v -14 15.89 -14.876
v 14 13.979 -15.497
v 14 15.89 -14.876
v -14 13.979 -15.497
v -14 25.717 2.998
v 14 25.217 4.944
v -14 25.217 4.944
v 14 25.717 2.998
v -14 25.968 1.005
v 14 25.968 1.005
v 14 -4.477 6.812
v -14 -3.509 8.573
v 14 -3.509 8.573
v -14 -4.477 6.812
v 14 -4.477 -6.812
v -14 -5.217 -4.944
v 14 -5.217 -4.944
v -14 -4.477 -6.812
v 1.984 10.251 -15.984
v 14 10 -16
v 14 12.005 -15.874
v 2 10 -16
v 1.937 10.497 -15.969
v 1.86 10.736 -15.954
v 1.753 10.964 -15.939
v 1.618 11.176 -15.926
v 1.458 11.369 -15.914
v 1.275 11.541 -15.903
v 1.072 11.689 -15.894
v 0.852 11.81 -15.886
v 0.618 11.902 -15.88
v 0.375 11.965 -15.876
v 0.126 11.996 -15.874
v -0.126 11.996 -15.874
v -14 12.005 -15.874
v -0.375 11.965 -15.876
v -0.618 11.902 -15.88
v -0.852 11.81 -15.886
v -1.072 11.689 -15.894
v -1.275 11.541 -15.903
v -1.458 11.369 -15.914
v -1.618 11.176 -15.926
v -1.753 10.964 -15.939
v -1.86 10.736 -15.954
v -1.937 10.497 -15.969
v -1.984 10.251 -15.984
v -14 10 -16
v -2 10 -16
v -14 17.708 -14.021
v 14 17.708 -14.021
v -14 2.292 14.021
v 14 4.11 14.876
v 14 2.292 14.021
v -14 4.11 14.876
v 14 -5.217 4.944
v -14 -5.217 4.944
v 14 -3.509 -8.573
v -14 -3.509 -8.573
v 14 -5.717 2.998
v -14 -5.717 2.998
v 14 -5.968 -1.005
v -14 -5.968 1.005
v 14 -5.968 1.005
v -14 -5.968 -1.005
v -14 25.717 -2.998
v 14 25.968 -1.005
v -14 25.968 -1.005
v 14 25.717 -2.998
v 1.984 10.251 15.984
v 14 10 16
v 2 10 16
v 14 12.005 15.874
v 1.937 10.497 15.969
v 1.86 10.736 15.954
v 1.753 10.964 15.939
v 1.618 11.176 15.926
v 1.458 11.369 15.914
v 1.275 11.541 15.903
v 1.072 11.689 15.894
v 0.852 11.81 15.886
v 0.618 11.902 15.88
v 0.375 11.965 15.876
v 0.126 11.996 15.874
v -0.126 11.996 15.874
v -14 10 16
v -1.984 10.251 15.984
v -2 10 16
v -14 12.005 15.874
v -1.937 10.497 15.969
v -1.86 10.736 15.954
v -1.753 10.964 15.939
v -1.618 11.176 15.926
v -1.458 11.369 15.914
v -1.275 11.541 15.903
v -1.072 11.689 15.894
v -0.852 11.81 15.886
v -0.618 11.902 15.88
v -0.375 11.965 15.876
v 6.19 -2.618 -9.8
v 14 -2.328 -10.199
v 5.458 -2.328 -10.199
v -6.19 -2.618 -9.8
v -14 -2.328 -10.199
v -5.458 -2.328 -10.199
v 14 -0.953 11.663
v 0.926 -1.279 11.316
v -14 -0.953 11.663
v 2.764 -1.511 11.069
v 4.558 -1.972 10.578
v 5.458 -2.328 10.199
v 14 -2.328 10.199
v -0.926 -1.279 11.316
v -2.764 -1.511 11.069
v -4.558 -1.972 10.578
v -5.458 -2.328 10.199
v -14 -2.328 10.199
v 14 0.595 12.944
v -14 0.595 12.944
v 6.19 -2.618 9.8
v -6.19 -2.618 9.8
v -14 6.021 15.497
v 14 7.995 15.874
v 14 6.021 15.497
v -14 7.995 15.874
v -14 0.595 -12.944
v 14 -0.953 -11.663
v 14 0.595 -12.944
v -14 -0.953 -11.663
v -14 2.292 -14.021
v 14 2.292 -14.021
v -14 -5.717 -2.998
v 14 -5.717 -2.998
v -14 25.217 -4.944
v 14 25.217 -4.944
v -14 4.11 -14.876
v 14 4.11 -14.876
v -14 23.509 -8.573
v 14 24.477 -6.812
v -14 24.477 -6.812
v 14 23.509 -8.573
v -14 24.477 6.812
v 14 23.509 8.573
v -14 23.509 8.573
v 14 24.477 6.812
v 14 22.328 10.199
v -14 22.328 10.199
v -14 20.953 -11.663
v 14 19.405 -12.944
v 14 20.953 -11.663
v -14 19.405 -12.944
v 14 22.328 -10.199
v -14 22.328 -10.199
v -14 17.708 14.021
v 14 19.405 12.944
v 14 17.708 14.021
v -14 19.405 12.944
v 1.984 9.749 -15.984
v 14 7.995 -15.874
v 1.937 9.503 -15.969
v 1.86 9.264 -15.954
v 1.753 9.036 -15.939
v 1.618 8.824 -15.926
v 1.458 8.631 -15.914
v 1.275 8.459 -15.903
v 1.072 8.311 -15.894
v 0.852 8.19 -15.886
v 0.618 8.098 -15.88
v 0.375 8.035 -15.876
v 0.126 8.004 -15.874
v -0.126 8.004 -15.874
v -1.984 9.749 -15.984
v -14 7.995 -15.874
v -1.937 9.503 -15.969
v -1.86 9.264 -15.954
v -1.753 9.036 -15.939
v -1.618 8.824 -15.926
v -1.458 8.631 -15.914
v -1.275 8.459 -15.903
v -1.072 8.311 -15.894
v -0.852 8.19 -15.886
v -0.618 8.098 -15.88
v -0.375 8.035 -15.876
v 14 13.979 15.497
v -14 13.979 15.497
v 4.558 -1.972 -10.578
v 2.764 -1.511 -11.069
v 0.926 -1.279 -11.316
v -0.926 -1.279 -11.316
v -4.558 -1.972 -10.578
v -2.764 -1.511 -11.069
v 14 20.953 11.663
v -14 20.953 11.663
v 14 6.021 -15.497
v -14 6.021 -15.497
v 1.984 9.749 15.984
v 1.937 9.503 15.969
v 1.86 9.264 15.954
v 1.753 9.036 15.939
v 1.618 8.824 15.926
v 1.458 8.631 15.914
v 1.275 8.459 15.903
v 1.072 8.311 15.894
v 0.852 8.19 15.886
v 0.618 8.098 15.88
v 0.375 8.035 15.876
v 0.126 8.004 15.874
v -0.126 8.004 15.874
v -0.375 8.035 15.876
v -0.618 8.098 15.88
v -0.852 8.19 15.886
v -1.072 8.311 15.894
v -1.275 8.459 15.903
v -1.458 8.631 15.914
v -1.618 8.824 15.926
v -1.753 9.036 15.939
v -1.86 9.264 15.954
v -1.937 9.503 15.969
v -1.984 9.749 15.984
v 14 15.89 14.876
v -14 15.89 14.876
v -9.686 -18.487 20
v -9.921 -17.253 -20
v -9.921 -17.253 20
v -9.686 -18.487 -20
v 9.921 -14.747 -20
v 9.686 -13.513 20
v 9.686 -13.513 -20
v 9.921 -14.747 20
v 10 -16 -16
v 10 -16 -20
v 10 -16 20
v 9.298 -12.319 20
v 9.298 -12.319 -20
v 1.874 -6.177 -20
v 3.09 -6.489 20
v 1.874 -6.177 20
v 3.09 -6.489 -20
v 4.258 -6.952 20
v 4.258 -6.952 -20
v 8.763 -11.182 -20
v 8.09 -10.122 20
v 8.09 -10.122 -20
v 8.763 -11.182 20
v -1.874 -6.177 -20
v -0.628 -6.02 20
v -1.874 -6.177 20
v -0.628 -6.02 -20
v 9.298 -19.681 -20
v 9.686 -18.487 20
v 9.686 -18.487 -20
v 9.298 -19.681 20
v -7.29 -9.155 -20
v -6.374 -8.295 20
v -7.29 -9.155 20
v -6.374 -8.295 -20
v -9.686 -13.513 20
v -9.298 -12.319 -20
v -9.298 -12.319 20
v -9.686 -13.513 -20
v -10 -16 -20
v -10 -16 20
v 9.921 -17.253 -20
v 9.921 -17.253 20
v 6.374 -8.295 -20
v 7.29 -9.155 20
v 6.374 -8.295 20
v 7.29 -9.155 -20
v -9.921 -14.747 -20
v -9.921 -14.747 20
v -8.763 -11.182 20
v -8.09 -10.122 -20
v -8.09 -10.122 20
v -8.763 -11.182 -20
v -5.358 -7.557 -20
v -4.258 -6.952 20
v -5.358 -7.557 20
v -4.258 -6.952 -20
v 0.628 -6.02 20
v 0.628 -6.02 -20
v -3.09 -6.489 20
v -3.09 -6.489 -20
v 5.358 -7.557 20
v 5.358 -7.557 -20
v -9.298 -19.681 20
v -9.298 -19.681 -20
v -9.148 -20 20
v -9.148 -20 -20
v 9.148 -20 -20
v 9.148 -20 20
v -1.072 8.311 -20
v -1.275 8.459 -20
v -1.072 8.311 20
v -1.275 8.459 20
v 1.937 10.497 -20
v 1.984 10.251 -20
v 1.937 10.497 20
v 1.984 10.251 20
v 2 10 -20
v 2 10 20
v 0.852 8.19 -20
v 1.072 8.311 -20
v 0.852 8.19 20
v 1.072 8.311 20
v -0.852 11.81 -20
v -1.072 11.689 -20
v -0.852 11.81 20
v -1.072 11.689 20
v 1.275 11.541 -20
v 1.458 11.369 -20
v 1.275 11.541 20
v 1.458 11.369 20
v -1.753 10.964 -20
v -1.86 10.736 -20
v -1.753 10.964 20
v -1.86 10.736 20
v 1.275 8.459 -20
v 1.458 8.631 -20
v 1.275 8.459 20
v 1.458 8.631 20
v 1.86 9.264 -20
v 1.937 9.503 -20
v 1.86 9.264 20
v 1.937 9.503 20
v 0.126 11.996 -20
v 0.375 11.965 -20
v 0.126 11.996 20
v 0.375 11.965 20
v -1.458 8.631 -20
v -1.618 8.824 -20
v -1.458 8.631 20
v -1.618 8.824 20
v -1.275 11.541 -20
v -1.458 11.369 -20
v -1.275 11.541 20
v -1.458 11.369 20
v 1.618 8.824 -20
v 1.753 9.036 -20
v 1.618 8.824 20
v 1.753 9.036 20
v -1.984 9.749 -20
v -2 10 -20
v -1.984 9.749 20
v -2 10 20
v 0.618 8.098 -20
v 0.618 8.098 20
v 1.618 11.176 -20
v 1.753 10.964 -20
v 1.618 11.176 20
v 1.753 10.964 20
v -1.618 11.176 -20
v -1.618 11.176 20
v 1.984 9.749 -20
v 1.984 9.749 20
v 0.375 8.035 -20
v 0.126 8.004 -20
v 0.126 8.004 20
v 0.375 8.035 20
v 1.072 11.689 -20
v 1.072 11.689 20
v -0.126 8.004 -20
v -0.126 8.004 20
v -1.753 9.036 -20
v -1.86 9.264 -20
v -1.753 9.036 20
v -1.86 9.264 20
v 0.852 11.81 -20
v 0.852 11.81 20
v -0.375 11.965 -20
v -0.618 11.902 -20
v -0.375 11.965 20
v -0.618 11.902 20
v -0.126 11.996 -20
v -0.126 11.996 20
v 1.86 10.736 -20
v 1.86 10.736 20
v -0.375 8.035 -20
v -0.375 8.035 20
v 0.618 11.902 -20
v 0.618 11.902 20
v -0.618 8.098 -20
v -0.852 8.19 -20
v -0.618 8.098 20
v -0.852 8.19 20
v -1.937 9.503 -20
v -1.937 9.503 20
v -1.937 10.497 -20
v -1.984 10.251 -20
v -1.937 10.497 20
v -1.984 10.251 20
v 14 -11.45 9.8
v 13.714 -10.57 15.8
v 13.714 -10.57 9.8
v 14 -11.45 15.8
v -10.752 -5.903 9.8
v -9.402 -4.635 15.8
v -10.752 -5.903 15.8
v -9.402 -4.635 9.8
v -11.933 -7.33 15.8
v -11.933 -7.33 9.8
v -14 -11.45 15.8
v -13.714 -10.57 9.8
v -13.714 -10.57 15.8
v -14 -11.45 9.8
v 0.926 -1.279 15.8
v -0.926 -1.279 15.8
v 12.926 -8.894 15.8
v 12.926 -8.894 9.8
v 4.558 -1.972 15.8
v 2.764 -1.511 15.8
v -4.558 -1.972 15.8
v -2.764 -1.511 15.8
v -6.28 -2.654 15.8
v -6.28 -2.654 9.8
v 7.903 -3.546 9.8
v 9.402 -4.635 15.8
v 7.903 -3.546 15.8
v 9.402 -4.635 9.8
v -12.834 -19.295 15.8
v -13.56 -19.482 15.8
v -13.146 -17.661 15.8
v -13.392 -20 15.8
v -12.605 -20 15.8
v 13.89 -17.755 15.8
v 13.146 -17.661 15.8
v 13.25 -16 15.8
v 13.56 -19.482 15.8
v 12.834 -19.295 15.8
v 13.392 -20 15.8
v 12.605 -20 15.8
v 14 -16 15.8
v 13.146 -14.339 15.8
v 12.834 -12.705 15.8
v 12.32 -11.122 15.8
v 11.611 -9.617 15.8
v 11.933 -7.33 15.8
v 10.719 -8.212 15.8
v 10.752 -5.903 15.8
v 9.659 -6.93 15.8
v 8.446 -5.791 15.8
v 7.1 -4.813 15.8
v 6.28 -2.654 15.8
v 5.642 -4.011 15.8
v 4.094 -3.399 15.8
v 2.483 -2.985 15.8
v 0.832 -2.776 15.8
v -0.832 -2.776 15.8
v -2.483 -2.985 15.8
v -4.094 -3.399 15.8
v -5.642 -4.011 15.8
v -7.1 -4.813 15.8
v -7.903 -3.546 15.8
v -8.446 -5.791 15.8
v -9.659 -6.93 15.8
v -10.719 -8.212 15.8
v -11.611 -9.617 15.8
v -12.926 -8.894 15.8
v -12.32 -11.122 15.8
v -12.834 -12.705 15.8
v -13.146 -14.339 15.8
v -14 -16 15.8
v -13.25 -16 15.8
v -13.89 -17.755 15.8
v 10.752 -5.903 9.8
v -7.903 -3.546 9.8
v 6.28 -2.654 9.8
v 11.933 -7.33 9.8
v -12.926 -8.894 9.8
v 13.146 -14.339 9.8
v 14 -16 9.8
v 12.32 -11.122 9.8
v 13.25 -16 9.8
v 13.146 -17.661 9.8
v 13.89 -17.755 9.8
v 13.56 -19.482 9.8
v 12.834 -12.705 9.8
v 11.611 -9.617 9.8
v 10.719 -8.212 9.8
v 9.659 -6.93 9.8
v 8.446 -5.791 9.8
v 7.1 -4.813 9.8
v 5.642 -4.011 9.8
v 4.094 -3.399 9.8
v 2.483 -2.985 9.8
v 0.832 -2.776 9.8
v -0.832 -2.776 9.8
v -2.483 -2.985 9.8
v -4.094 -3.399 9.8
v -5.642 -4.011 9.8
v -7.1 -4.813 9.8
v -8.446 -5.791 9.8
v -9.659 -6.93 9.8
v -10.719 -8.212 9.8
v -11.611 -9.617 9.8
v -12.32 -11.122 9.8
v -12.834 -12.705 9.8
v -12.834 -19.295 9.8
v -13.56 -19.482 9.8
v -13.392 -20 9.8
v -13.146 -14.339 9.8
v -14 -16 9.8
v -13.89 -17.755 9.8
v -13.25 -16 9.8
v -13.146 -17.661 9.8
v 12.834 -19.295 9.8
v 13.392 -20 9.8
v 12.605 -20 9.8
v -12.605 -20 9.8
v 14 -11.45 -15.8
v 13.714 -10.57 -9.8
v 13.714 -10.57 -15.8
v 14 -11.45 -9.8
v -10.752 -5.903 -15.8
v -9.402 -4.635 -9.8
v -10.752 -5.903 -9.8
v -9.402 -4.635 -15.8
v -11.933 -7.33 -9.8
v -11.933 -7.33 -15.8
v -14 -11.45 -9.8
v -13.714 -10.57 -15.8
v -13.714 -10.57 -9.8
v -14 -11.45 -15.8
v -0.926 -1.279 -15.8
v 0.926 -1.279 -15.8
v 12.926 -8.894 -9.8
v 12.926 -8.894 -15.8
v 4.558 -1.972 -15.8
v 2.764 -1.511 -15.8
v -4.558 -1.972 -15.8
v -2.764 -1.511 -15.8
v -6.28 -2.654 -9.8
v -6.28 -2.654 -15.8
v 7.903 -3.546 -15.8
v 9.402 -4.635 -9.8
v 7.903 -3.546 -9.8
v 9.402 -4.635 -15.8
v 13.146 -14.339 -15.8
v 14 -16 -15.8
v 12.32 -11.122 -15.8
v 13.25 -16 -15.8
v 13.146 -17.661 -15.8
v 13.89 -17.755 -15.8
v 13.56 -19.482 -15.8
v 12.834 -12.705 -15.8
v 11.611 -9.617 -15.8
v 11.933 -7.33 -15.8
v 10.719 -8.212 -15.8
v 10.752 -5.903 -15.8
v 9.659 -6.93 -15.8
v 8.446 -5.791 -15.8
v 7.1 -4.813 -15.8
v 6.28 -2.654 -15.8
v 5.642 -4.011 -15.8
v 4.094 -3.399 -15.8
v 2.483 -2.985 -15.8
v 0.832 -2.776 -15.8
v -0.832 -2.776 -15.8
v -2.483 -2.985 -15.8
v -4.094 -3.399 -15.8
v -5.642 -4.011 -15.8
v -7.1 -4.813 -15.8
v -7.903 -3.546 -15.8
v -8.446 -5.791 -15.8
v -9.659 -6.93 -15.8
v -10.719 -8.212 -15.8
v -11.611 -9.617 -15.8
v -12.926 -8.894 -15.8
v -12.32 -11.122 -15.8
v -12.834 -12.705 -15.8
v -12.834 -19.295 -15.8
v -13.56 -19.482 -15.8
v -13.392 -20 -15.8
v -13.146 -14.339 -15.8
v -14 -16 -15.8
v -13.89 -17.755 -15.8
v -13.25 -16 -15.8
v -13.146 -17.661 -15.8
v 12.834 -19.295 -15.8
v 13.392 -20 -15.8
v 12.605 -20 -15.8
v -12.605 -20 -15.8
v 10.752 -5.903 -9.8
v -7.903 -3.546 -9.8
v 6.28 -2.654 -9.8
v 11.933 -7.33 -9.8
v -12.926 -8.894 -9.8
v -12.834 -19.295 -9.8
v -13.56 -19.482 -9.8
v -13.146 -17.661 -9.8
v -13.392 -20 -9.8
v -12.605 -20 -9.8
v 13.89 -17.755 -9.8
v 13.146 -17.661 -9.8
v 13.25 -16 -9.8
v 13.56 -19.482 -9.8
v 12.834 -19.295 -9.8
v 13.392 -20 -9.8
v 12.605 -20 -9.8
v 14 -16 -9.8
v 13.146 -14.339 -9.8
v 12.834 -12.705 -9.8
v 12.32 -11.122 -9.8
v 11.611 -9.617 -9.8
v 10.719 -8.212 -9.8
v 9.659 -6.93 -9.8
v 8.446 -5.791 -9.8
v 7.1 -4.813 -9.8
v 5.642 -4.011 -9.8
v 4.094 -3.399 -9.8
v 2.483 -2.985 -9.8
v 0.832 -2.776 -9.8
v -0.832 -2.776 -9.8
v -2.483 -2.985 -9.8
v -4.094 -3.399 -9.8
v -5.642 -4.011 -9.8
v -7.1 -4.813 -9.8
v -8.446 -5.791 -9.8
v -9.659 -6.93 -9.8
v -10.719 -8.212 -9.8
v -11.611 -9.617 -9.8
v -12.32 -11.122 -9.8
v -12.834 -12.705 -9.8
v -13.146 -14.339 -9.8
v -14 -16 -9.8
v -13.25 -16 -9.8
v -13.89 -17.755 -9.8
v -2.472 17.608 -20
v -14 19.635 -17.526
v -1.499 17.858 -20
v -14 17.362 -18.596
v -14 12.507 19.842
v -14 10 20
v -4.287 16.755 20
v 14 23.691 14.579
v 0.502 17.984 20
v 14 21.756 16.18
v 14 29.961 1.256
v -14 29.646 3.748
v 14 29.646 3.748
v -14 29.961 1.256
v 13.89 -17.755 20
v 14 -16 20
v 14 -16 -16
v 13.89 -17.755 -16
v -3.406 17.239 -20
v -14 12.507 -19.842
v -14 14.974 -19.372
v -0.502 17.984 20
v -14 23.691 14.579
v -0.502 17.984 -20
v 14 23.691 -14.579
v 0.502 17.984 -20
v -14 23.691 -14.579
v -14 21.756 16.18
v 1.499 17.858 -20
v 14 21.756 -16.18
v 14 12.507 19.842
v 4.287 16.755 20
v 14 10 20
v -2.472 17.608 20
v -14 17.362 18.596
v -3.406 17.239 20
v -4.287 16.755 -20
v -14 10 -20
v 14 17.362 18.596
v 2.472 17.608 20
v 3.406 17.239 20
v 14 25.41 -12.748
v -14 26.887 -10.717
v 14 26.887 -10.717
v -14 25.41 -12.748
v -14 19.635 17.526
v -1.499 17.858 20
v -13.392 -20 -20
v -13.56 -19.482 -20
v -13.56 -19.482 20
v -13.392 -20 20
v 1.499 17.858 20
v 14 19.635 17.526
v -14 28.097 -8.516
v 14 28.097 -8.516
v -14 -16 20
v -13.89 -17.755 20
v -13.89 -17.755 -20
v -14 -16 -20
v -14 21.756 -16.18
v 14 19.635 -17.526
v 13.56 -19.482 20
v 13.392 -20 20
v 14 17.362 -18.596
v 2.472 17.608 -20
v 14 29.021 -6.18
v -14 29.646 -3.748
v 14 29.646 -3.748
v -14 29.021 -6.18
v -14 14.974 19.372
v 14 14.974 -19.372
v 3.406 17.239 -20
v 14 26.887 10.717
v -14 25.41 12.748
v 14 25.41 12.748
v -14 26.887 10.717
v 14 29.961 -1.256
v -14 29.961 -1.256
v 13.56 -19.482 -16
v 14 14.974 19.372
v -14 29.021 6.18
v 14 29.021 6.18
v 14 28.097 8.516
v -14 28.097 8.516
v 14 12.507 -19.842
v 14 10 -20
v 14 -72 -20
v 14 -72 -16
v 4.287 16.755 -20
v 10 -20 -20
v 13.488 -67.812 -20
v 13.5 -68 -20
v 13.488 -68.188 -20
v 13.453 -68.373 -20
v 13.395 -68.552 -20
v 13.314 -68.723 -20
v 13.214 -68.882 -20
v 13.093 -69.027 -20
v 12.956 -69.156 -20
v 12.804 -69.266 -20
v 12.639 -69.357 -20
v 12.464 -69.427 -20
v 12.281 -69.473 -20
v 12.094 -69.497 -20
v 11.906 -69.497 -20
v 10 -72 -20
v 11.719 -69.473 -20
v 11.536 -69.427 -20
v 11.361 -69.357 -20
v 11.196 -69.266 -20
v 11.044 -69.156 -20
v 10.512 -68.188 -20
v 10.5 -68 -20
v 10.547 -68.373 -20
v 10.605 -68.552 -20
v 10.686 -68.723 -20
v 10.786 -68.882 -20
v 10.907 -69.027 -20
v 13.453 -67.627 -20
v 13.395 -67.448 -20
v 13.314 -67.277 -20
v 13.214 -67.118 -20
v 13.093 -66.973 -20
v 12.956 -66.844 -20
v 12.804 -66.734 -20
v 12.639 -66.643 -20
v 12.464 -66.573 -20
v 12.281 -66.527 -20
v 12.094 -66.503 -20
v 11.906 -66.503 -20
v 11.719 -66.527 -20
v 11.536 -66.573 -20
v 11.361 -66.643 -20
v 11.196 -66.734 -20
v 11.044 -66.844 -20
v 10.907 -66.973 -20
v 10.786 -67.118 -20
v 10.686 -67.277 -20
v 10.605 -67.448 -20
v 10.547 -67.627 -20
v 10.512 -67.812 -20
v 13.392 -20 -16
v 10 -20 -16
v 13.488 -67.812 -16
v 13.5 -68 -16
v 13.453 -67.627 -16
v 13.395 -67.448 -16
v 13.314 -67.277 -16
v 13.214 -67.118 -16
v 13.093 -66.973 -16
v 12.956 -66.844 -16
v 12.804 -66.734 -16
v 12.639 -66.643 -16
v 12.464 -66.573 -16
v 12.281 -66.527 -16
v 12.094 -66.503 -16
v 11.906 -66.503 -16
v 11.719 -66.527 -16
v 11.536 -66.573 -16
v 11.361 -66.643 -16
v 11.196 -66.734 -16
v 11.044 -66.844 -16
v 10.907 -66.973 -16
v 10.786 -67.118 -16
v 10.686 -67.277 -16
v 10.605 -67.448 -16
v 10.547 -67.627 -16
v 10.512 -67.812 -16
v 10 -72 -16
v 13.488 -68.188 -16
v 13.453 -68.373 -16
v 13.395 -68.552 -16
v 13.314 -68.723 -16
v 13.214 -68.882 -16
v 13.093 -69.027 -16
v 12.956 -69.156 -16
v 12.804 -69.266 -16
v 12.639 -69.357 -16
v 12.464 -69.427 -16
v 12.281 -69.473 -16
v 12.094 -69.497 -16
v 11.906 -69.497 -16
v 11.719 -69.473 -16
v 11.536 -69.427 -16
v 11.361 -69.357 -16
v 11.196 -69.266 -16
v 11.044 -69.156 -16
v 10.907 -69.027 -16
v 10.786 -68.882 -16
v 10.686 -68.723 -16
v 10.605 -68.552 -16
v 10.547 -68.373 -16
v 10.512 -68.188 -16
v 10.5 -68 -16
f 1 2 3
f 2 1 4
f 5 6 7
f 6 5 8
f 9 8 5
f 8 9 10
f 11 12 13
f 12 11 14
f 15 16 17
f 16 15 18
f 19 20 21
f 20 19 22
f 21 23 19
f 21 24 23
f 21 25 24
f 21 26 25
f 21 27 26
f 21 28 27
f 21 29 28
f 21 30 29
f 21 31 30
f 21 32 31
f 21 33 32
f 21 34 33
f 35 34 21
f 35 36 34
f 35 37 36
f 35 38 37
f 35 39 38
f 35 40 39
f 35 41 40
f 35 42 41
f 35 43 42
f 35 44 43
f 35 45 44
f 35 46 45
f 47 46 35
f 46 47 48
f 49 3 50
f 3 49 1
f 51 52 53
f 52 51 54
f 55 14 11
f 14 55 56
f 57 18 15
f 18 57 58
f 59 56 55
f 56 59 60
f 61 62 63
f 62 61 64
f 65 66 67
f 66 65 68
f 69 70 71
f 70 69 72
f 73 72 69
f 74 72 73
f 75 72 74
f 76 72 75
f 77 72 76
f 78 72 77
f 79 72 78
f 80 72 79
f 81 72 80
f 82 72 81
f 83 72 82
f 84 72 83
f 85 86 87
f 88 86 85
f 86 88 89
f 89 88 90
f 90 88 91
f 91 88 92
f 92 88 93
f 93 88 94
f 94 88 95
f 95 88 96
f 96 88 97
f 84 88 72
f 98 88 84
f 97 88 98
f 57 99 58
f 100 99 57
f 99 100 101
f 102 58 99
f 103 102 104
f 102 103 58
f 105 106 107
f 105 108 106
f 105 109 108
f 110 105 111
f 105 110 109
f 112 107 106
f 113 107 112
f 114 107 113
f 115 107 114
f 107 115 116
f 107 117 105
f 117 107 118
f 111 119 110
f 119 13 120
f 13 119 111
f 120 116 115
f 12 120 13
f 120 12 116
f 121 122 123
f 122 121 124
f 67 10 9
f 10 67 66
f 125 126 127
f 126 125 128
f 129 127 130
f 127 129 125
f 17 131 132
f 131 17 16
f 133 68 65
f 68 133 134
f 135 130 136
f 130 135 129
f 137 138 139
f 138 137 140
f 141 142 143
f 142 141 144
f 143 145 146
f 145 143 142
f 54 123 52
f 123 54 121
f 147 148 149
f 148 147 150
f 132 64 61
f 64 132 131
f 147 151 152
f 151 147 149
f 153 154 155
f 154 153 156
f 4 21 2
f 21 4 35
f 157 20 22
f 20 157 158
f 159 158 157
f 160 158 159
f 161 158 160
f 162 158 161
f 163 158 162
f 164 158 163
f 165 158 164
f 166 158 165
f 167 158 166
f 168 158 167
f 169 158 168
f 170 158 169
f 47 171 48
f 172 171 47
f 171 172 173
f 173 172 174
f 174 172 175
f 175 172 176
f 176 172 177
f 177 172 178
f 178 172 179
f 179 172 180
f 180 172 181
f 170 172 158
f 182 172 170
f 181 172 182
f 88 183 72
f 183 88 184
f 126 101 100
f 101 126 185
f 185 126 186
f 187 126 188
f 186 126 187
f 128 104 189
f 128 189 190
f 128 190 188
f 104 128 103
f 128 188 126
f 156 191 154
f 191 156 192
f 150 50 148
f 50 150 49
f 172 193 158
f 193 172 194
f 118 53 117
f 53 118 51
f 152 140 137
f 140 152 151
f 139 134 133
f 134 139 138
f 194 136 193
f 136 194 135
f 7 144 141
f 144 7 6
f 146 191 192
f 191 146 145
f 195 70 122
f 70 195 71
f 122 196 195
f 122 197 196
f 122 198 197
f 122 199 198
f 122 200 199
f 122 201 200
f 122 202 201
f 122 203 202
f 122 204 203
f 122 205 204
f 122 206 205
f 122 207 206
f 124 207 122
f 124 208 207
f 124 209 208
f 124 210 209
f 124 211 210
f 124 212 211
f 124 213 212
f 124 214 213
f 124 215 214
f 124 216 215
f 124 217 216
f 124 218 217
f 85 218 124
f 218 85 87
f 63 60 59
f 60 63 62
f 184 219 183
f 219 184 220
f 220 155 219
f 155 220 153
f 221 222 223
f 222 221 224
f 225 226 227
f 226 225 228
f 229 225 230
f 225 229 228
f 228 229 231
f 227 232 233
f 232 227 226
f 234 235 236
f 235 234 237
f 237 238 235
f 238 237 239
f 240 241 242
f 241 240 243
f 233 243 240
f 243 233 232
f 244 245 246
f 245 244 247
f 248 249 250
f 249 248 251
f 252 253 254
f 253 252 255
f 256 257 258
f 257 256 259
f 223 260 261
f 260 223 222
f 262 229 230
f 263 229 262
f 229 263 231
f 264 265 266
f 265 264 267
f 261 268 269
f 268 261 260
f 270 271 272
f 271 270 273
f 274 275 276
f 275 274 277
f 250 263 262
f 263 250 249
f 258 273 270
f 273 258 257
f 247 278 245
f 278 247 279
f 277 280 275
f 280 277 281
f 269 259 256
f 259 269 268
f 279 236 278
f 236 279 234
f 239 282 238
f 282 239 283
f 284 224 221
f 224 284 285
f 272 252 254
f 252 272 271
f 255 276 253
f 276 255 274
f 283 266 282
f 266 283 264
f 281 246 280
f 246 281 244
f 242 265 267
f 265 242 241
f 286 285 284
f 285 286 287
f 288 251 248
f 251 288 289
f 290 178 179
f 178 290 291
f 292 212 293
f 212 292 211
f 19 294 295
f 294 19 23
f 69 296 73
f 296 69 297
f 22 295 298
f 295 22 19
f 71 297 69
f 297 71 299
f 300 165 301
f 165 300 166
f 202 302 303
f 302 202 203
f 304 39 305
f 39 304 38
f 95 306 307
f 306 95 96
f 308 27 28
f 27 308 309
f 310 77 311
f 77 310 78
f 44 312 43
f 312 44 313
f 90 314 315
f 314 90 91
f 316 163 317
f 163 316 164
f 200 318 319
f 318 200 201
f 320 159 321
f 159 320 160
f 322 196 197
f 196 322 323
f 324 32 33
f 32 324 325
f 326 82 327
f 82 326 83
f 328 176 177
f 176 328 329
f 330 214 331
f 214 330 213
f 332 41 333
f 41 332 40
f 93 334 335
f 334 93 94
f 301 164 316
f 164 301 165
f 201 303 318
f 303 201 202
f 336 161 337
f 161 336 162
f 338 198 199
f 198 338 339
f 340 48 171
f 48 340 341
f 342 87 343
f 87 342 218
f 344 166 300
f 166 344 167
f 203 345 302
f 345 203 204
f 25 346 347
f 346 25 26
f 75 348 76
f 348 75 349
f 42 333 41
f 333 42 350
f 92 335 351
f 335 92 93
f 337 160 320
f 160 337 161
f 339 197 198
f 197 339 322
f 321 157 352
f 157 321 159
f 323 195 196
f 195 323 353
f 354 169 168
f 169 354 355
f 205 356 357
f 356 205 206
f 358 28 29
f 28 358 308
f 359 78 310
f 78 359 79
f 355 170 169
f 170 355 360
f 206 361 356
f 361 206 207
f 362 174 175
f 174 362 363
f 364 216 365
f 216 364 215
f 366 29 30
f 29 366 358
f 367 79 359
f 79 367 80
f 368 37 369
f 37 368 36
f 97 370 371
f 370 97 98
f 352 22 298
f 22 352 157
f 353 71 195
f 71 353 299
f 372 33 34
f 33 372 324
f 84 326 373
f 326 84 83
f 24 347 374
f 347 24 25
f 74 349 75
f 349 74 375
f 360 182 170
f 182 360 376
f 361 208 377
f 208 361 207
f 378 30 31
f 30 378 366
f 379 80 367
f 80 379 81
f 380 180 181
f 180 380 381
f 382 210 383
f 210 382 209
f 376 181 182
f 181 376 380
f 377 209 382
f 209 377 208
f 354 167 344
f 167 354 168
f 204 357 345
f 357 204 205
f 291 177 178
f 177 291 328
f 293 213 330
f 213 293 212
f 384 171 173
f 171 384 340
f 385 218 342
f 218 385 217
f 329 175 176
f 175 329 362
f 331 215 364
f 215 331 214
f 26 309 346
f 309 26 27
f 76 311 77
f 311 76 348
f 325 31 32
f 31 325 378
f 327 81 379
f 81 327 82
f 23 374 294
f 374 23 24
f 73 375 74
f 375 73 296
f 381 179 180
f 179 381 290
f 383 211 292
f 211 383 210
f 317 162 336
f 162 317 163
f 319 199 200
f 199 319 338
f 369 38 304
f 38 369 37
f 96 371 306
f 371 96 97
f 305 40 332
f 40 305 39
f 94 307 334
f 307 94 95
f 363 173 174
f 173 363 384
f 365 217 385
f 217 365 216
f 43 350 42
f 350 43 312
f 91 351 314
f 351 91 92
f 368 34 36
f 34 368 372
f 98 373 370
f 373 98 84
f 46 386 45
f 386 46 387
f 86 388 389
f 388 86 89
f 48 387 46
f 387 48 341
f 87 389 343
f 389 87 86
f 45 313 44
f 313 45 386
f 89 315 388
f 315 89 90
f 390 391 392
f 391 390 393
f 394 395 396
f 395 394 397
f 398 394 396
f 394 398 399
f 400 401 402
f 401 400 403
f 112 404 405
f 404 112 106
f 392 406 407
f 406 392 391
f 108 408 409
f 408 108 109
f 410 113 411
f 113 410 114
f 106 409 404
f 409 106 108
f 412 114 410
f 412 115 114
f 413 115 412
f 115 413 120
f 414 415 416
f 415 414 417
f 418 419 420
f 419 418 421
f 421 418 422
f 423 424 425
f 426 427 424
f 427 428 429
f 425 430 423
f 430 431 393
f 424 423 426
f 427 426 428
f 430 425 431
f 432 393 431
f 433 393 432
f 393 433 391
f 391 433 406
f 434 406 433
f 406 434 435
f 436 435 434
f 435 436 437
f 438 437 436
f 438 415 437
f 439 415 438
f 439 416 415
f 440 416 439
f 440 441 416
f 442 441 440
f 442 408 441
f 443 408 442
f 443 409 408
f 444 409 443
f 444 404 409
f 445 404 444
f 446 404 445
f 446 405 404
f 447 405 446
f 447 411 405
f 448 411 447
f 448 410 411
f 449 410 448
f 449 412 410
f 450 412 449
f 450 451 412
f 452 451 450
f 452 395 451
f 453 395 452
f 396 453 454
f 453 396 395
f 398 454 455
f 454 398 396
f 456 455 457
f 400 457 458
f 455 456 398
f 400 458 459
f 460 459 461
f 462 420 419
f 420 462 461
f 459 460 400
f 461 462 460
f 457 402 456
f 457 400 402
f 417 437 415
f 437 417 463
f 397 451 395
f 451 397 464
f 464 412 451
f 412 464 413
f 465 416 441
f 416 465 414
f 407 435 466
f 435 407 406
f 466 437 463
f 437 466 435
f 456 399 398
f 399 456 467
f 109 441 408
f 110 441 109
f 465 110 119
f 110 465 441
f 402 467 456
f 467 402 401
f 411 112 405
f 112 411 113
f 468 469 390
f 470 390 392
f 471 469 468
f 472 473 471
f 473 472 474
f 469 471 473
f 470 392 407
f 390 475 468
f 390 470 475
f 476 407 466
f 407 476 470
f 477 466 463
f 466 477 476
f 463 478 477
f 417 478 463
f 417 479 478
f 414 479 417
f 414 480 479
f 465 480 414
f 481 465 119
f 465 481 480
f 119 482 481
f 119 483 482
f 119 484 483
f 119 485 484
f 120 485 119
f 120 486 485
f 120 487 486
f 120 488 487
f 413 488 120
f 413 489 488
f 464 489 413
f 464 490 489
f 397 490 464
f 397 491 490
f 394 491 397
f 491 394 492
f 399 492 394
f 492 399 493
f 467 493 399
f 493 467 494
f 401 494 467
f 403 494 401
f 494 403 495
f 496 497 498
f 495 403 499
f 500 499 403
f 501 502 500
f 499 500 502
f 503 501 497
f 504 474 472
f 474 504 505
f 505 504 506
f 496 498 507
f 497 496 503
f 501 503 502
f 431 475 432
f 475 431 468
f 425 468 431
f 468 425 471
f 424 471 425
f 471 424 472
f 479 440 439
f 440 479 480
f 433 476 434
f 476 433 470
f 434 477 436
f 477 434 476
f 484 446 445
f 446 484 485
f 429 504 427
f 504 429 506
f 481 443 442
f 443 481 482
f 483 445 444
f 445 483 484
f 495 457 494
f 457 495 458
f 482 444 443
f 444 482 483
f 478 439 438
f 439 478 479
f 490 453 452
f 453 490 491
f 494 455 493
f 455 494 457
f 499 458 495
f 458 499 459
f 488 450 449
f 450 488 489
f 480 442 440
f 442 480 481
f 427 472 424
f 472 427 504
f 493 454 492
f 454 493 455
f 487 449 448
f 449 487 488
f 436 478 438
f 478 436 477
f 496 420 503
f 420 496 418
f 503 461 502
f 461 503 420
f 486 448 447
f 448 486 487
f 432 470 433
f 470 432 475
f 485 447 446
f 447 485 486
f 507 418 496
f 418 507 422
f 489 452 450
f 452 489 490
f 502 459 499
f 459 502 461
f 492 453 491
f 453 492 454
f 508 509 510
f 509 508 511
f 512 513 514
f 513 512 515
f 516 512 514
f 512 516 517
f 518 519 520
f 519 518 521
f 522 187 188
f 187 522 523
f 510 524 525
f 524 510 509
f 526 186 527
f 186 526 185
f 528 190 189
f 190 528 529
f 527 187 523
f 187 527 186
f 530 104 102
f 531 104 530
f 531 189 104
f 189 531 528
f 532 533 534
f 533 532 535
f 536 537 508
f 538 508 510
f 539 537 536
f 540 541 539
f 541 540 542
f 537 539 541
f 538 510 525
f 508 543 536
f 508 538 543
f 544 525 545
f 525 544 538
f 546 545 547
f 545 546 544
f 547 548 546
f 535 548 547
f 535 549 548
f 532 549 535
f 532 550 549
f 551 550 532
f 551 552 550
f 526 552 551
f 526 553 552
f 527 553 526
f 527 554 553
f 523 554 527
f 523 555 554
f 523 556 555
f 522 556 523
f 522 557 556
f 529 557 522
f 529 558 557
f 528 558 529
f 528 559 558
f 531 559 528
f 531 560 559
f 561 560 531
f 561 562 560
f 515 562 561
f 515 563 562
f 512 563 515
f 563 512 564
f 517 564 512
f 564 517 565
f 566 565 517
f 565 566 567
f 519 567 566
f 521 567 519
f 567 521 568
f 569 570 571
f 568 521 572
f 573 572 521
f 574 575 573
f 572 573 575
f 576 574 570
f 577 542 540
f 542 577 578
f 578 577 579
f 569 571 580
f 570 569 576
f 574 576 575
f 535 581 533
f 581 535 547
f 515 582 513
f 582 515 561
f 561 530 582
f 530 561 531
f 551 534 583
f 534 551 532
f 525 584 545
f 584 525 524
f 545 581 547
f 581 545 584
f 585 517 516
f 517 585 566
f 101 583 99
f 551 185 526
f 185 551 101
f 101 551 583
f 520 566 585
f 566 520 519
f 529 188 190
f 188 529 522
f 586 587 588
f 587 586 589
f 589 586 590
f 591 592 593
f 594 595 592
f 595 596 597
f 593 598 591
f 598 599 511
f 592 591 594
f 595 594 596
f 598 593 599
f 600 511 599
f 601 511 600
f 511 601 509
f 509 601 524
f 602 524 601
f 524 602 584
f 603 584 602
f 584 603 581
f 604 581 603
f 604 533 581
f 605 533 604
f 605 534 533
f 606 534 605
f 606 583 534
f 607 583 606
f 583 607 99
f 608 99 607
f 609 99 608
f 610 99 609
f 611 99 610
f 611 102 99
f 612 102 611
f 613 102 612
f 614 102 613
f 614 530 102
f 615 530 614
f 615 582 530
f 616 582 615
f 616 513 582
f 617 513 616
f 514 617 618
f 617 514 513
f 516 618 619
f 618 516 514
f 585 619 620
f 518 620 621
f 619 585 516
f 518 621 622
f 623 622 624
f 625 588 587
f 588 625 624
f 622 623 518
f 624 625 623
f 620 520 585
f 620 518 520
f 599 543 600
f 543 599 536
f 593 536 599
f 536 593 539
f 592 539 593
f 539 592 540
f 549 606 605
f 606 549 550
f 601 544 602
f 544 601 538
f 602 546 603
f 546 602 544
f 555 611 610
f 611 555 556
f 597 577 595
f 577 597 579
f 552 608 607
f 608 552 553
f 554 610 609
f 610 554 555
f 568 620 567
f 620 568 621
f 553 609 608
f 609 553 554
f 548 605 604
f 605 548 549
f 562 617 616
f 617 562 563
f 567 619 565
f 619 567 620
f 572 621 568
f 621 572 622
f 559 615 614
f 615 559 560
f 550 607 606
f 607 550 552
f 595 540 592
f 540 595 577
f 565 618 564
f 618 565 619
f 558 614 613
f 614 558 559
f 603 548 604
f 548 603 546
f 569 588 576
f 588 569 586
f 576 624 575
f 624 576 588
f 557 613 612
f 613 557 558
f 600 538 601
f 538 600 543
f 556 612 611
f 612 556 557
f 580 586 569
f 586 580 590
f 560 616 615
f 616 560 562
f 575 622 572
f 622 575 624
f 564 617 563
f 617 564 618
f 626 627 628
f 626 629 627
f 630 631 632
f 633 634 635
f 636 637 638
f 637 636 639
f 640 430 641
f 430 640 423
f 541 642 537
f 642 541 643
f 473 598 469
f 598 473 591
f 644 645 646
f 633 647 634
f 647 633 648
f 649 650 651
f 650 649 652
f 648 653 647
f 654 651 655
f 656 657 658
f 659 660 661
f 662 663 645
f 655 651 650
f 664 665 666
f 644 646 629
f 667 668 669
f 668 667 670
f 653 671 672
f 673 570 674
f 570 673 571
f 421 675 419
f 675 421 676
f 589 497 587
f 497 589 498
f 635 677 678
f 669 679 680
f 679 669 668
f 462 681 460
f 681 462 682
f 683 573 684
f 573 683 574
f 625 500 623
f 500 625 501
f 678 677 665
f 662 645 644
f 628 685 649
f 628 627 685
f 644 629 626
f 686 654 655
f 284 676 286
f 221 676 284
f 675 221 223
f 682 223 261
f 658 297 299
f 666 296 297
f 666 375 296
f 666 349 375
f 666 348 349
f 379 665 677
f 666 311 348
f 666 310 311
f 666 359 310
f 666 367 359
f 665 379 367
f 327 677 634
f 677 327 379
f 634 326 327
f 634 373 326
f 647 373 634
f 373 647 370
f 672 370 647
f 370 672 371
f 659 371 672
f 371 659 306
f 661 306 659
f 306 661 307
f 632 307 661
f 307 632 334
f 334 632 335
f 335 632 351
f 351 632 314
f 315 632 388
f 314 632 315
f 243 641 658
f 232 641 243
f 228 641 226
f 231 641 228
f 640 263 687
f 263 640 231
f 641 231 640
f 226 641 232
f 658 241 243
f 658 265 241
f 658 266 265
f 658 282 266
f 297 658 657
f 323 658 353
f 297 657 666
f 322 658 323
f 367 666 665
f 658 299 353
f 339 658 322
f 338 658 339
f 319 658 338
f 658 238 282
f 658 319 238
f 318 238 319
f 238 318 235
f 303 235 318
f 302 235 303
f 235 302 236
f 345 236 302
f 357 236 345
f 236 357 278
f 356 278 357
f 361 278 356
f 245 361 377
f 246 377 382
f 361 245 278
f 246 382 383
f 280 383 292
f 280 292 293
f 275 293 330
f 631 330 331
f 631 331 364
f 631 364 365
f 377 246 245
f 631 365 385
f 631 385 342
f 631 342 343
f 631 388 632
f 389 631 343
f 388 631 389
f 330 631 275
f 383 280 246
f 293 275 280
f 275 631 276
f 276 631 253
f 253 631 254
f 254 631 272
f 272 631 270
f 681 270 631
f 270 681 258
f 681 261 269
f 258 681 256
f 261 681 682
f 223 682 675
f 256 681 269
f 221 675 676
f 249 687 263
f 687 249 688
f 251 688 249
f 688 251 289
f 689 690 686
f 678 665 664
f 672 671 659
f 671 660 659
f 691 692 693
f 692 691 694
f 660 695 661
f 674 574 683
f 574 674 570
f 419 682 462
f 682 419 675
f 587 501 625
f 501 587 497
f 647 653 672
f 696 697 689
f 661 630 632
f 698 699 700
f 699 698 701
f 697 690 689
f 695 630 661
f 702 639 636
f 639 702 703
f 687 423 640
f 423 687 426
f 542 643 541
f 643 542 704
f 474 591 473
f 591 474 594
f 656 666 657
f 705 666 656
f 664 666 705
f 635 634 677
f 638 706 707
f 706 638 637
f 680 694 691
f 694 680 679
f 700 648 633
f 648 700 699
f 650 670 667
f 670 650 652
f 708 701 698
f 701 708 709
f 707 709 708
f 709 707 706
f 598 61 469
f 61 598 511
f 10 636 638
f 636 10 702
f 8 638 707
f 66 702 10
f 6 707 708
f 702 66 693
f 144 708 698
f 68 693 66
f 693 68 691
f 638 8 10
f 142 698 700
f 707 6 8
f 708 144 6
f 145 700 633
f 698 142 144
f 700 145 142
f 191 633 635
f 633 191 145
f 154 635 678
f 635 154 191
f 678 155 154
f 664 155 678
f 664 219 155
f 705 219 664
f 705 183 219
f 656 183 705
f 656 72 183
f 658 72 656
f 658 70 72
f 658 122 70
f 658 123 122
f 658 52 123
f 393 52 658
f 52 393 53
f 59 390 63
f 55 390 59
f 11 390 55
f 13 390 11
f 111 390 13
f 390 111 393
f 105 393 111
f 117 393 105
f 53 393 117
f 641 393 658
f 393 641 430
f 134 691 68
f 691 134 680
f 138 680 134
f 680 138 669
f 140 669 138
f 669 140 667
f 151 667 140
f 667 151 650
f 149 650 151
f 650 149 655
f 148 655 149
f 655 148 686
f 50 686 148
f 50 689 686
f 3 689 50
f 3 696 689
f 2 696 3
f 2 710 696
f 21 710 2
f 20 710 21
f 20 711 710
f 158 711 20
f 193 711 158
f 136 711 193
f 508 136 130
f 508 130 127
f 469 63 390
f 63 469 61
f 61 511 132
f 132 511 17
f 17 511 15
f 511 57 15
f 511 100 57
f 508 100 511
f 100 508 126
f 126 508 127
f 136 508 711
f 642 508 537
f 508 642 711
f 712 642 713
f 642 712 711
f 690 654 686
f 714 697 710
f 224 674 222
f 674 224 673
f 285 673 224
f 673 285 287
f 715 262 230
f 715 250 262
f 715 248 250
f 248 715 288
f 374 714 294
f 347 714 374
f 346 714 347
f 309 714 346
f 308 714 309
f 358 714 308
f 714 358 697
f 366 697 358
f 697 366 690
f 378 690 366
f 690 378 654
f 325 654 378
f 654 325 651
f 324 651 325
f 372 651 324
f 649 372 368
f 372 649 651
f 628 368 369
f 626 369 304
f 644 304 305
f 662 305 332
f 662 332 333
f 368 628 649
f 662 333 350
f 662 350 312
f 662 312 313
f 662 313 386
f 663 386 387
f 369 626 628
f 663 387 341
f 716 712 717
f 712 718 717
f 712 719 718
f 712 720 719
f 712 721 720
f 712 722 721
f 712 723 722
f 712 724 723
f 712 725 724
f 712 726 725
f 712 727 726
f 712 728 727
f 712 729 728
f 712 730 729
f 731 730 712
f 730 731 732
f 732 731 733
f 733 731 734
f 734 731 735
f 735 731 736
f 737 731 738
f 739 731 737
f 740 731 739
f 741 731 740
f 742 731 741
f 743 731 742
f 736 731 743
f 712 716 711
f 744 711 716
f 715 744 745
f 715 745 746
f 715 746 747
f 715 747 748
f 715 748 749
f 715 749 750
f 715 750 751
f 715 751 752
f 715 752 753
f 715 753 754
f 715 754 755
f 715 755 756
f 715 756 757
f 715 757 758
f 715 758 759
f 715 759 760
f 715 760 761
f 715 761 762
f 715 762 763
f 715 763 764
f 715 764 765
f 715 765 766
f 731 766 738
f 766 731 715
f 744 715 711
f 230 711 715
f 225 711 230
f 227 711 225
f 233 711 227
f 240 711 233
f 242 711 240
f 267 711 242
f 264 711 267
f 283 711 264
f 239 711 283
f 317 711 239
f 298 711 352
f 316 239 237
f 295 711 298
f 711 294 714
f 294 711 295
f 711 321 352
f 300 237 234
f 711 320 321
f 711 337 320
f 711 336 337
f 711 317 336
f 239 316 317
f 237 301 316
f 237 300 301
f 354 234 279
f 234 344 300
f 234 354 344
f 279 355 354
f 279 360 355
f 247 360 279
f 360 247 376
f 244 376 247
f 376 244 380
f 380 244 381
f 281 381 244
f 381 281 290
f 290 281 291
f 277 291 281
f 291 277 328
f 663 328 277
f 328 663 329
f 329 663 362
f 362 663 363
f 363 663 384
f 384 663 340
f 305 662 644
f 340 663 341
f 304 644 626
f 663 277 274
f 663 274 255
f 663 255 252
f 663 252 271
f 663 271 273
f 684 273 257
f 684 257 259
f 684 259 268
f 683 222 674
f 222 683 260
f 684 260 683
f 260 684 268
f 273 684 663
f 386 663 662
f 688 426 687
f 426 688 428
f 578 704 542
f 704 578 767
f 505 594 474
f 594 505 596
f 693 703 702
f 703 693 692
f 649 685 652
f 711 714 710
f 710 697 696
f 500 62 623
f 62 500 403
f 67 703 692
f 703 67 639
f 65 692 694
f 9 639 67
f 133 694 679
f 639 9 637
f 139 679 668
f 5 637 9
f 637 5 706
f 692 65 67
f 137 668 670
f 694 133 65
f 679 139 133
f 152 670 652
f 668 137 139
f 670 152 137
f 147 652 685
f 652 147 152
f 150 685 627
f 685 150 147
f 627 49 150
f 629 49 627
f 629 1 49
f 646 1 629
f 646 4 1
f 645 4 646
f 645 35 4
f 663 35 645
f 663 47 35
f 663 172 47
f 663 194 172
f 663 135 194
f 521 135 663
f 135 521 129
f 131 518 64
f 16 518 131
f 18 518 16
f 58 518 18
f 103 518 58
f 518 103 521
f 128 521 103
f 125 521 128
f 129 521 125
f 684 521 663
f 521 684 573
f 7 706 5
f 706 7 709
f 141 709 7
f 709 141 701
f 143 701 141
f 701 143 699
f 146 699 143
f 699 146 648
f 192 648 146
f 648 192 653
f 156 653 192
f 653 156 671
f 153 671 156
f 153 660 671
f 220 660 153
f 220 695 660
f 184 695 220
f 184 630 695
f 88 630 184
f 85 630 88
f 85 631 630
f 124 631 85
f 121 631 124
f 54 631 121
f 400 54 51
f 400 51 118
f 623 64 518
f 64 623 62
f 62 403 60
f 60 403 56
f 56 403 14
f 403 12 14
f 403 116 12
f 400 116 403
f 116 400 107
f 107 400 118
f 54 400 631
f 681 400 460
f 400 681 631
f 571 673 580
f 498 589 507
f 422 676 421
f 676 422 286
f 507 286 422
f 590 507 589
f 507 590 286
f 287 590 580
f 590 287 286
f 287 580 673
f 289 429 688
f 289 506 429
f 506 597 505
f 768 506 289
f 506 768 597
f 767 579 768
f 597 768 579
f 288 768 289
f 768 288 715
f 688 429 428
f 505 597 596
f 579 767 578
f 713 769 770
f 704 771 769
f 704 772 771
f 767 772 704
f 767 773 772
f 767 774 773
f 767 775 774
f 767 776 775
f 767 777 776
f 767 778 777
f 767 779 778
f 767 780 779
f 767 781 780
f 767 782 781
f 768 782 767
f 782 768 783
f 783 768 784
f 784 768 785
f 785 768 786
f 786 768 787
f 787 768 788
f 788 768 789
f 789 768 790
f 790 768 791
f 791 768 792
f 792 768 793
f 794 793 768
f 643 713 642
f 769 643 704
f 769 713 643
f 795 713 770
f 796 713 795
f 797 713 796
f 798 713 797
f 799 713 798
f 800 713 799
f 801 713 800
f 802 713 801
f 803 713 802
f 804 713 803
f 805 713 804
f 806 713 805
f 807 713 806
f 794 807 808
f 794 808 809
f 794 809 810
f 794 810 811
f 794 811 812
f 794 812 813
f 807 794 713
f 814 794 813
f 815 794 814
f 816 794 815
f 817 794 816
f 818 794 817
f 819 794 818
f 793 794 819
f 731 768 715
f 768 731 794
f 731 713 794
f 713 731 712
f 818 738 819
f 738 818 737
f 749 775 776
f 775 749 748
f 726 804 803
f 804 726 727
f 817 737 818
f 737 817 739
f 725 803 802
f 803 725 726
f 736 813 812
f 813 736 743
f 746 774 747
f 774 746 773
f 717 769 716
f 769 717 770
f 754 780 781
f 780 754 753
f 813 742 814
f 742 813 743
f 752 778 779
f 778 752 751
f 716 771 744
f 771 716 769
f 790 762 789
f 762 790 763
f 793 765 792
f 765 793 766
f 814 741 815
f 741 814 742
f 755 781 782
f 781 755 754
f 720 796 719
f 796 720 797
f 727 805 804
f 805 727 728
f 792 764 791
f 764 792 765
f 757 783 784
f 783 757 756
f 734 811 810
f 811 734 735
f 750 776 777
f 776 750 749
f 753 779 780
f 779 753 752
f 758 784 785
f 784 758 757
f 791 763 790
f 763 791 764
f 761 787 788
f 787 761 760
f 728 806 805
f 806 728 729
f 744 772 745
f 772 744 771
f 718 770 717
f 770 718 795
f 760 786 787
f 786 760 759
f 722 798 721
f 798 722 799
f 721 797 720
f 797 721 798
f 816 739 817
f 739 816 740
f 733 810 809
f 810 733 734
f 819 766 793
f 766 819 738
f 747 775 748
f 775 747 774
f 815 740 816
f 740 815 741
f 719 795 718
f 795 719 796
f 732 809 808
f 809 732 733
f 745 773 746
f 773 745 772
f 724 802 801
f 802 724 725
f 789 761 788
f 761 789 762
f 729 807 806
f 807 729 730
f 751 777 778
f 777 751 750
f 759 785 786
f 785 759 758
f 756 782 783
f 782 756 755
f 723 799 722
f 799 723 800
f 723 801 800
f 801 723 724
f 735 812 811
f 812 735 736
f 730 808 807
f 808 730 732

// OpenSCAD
// Antenna to axis mount
// Satnogs Project 2014 MPL2.0 http://satnogs.org

$fn=50;

mast_1 = 32;		 // Axis mast diameter
mast_2 = 20;		 // Antenna mast diameter
offset = 8;			 // Extra width of mount
tireup_w = 6; 		 // Width of tireup
tireup_h = 1.5;	 // Height of tireup
washer = 16;		 // Washer diameter
bolt = 4;			 // Bolt for antenna mast


module axises() {
	translate([0,(mast_1+mast_2)/2-mast_1/2,0])
		rotate([0,90,0])
			cylinder(h=mast_2+offset+1, d=mast_1, center=true);
	translate([0,-(mast_1+mast_2)/2+mast_2/2,0])
		cylinder(h=mast_1+offset+1, d=mast_2, center=true);
	// Bolt for antenna mast cylinder
	translate([0,(mast_1+mast_2)/2-mast_1/2,0])
		cylinder(h=mast_1+offset+1, d=bolt, center=true);
}

module axises_outer() {
	translate([0,(mast_1+mast_2)/2-mast_1/2,0])
		rotate([0,90,0])
			cylinder(h=mast_2+offset, d=mast_1+offset, center=true);
	translate([0,-(mast_1+mast_2)/2+mast_2/2,0])
		cylinder(h=mast_1+offset, d=mast_2+offset, center=true);
	// Outer washer stud
	translate([0,(mast_1+mast_2)/2-mast_1/2,0])
		cylinder(h=mast_1+offset, d=washer, center=true);
}

module tire_up() {
	difference() {
		cylinder(h=tireup_w,d=mast_2+offset+tireup_h,center=true);
		cylinder(h=tireup_w,d=mast_2+offset-tireup_h,center=true);
	}
}

module cut() {
	translate([0,-(mast_1+mast_2)/2,0])
		cube([offset*5,offset*1.5,mast_1+offset*4],center=true);
}

module main_connector() {
	difference() {
		hull() {
			axises_outer();
		}
		axises();
		mirror([0,0,1]) {
			translate([0,-(mast_1+mast_2)/2+mast_2/2,(2*mast_1)/5])
				tire_up();
		}
		translate([0,-(mast_1+mast_2)/2+mast_2/2,(2*mast_1)/5])
			tire_up();
		cut();
	}
}

module extender() {
	difference() {
		translate([mast_1/2-offset/2,-mast_2*2,-mast_1/2-offset/4])
			cube([offset/2,mast_1*2,offset/2],center=true);
		translate([mast_1/2-offset/2,-mast_1*2-4,-mast_1/2-offset/4])
			cylinder(d=3,offset/2,center=true);
	}
}

difference() {
	union() {
		main_connector();
		extender();
	}
}
